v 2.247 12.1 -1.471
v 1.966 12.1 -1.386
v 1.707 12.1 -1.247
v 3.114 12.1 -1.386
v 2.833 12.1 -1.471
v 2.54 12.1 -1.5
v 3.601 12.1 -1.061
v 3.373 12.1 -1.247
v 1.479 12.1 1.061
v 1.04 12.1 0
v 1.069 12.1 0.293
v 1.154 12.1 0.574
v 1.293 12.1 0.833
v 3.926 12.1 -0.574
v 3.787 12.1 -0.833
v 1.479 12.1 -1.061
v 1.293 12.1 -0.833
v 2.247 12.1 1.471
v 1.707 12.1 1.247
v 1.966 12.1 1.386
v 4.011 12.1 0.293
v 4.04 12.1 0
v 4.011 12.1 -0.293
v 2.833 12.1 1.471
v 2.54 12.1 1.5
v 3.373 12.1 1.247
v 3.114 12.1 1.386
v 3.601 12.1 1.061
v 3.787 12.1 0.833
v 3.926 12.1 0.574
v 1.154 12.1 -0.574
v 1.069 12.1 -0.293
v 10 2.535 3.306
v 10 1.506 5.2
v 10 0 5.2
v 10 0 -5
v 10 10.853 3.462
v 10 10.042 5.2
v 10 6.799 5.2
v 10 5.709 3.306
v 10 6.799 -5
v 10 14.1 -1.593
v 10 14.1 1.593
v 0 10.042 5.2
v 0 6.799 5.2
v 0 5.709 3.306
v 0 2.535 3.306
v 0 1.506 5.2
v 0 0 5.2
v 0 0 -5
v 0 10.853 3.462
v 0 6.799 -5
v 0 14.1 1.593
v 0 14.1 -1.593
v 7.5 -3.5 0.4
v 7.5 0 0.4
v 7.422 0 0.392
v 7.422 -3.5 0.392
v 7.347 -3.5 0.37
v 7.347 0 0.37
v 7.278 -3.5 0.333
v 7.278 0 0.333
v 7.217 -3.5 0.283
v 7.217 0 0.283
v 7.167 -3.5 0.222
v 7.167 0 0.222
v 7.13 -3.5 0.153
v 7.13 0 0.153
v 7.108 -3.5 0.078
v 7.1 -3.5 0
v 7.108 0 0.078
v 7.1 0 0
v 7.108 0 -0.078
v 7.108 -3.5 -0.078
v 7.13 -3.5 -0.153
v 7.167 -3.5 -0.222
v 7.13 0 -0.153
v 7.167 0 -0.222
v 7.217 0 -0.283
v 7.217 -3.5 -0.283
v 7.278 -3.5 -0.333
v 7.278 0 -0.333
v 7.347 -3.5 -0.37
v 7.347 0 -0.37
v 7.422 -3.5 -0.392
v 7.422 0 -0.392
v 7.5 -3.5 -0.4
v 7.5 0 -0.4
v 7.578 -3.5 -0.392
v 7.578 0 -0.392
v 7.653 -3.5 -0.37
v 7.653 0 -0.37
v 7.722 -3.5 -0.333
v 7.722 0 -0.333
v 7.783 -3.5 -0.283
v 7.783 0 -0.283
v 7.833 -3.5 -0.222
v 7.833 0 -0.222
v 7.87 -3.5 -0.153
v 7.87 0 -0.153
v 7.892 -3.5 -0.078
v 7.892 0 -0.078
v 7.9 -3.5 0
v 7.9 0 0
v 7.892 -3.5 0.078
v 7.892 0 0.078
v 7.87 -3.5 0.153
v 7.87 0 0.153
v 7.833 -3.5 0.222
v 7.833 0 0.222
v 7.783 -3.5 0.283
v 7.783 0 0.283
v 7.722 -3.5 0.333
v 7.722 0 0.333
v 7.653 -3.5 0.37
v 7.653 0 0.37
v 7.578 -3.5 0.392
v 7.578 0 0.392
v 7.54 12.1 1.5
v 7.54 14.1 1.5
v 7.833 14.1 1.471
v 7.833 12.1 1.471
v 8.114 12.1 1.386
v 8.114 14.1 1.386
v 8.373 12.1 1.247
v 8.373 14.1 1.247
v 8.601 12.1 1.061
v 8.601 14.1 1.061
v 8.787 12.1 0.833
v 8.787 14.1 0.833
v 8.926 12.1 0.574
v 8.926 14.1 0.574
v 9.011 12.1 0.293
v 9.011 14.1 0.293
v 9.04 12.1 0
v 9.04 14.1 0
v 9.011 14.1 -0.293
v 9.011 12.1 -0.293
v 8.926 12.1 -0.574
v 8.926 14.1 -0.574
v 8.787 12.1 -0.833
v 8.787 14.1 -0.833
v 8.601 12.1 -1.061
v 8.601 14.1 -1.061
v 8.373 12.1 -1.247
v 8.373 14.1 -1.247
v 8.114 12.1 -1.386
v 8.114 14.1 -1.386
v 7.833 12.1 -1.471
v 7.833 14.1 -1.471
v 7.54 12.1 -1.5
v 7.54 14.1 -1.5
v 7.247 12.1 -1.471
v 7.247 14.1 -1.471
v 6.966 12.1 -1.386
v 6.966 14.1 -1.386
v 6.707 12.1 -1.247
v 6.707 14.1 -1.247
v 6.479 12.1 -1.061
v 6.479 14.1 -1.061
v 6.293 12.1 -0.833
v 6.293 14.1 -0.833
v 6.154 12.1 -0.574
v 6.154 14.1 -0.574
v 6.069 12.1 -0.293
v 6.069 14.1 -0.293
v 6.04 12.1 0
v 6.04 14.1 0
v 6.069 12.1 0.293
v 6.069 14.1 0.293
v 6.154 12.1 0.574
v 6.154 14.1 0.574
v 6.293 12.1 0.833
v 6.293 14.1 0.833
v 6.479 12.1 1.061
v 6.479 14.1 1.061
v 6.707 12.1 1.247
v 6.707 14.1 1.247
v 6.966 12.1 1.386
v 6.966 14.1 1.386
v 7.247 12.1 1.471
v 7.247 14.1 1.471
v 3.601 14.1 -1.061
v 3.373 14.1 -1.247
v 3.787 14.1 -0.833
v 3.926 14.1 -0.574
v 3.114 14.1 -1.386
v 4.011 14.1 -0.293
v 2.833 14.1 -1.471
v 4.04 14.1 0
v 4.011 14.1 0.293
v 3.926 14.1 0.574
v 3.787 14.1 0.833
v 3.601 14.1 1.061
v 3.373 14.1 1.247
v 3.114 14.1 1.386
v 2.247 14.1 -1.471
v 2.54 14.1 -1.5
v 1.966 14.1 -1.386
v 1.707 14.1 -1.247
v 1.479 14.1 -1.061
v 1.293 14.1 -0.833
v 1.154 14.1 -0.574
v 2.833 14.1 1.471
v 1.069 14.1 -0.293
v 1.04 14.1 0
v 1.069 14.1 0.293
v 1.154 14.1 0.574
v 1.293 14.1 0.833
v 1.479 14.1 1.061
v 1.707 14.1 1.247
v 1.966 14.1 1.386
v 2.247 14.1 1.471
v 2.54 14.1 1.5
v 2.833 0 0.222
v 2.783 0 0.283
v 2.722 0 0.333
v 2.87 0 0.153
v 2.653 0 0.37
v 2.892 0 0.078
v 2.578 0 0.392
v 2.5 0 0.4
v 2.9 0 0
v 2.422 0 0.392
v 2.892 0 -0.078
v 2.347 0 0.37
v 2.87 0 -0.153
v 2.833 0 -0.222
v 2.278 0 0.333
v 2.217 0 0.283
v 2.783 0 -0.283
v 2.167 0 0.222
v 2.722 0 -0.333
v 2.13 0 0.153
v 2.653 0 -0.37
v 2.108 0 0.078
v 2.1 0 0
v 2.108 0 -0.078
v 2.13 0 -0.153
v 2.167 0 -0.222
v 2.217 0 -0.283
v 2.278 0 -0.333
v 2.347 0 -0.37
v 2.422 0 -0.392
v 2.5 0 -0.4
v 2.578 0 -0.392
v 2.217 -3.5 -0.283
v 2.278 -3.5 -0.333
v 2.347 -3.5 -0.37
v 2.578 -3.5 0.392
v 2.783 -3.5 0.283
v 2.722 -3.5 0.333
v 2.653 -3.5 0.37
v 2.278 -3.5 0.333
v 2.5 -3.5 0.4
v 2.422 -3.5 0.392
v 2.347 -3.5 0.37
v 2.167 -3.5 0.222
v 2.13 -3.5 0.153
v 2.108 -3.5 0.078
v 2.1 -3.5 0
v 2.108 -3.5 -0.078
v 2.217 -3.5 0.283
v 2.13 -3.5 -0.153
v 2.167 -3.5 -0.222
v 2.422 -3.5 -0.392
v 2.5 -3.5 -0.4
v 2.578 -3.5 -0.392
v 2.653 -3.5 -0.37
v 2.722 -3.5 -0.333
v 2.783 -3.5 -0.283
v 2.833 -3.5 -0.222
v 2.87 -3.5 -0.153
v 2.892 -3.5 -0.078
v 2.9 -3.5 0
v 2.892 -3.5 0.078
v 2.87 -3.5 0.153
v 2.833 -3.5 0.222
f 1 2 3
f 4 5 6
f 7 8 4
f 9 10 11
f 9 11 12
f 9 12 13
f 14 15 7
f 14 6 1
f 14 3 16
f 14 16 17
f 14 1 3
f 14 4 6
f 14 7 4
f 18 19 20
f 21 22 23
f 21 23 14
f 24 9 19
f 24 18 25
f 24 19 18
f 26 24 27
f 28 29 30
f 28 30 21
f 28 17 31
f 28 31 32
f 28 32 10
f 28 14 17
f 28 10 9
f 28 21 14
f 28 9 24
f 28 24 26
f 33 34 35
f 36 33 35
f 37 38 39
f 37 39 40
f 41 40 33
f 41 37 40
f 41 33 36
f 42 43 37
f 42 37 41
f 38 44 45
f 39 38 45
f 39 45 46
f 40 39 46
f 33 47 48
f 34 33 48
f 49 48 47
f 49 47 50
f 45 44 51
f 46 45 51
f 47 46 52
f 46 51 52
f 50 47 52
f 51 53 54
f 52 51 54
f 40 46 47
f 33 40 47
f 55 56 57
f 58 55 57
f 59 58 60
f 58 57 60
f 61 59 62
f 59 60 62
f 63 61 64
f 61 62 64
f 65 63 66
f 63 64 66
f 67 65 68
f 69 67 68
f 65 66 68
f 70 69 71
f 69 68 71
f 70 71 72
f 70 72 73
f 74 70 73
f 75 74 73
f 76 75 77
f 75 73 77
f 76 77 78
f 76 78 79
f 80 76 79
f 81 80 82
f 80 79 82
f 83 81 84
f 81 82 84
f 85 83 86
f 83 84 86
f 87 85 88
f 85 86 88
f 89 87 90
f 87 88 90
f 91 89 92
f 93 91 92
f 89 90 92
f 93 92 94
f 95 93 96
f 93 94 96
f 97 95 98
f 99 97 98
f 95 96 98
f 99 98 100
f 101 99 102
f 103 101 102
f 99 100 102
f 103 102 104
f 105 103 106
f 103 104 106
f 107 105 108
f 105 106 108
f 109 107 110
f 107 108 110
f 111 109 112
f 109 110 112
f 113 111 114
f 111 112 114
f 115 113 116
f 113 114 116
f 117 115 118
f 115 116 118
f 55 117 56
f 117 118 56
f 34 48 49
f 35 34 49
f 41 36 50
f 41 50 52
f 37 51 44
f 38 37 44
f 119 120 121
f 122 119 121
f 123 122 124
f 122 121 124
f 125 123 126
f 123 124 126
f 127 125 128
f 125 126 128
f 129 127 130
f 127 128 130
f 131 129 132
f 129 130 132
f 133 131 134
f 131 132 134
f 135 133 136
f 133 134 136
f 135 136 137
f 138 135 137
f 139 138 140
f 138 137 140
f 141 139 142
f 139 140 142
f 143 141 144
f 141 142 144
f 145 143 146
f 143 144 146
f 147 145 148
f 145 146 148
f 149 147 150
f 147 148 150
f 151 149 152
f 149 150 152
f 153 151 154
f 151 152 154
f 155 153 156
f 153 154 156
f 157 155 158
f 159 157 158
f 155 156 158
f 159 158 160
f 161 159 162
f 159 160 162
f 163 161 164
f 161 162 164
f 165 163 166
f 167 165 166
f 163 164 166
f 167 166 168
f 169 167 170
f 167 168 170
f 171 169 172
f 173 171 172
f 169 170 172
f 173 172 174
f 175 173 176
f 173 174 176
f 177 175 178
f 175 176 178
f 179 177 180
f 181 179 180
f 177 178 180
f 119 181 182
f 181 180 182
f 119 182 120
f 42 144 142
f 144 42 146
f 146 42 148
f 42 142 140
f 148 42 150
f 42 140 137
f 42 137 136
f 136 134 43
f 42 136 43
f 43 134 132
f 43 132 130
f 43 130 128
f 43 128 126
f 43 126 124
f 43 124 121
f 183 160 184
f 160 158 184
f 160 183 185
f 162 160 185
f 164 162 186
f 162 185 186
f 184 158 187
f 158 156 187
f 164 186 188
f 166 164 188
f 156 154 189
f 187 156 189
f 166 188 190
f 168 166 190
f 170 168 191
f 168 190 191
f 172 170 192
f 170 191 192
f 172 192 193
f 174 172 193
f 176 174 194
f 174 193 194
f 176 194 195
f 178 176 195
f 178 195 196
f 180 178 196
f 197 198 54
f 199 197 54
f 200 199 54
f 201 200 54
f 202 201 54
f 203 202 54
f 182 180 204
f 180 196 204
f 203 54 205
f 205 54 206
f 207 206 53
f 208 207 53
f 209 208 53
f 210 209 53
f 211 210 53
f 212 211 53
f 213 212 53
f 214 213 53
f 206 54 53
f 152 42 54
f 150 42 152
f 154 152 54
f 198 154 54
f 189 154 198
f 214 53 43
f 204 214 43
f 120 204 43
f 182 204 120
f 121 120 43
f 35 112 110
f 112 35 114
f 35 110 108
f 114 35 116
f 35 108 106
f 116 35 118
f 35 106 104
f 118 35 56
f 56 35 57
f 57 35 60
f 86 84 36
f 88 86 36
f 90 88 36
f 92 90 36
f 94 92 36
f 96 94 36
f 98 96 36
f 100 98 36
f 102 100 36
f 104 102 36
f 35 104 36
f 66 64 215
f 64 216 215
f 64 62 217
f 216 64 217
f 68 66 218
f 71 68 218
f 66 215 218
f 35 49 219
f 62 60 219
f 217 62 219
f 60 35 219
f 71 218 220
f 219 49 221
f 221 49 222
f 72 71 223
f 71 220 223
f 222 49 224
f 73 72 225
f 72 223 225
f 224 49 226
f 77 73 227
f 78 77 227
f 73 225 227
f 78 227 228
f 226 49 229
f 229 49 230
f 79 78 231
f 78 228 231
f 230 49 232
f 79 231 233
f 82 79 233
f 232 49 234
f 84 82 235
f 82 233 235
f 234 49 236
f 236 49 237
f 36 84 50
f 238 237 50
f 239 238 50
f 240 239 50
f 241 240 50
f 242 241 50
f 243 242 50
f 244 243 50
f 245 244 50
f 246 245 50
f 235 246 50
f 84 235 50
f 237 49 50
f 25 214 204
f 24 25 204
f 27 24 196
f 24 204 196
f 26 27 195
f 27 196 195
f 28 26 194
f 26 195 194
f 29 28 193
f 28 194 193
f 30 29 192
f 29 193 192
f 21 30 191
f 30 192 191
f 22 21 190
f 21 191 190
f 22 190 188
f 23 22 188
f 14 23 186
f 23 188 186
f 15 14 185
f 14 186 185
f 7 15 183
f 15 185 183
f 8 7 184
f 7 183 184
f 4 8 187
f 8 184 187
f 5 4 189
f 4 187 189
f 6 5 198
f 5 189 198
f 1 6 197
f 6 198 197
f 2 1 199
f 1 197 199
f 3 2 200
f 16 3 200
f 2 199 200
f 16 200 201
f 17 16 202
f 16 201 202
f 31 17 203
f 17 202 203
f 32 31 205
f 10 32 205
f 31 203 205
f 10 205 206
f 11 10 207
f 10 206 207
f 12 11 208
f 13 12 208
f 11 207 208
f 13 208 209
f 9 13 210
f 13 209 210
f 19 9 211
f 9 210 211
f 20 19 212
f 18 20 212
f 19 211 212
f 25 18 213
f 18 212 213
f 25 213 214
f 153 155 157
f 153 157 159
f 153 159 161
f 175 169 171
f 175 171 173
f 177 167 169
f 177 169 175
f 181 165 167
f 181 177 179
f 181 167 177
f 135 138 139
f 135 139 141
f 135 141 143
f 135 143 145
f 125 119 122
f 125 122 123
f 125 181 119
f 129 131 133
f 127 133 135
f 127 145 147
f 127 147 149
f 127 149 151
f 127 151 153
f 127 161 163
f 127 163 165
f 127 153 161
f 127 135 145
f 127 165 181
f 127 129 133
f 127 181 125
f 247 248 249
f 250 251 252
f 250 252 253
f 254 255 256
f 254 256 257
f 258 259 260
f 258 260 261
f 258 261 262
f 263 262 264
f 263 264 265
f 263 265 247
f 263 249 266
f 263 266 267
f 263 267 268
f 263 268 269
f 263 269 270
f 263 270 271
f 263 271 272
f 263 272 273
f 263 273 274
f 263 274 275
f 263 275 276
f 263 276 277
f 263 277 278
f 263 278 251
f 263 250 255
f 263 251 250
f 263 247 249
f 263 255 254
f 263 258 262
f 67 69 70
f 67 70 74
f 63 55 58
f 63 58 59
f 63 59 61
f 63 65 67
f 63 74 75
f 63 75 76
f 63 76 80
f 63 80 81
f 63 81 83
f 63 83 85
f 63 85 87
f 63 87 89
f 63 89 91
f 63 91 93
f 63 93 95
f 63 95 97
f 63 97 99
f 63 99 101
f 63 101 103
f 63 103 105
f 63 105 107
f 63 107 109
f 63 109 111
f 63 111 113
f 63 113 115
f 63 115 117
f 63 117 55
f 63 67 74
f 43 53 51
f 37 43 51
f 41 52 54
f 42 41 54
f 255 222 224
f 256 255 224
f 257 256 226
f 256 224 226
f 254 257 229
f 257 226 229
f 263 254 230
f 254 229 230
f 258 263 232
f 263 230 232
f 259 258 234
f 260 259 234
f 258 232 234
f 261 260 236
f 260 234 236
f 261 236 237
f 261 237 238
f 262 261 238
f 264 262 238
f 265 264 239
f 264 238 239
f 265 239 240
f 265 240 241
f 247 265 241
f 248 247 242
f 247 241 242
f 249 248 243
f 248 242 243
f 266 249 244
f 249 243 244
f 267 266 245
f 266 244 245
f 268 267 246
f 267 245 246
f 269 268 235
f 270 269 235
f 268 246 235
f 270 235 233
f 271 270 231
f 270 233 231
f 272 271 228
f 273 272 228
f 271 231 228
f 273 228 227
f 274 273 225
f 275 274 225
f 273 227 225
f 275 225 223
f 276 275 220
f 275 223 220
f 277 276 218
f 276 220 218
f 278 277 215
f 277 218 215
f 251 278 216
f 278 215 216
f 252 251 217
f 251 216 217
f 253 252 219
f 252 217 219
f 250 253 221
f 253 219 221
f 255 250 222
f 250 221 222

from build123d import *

# Parameters (mm, degrees)
EXTRUDE_1_DEPTH     = 10
SKETCH_2_R          = 1.5
CUT_EXTRUDE_1_DEPTH = 2
SKETCH_3_R          = 0.4
EXTRUDE_2_DEPTH     = 3.5


with BuildPart() as part:
    # 草图1 → 凸台-拉伸1 (new body)
    with BuildSketch(Plane(origin=(0, 0, 0), x_dir=(0, 0, -1), z_dir=(1, 0, 0))):
        Polygon((0, 0), (5, 0), (5, 6.798949449), (1.592861235, 14.1), (-1.592861235, 14.1), (-3.462246636, 10.852770352), (-5.2, 10.041823104), (-5.2, 6.798949449), (-3.305827132, 5.708500208), (-3.305827132, 2.534594125), (-5.2, 1.506142854), (-5.2, 0), align=None)
    extrude(amount=EXTRUDE_1_DEPTH)

    # 草图2 → 切除-拉伸1 (cut)
    with BuildSketch(Plane(origin=(0, 14.1, 0), x_dir=(1, 0, 0), z_dir=(0, 1, 0))):
        with Locations(Location((2.54, 0, 0), (0, 0, 270))):
            Circle(SKETCH_2_R)
        with Locations(Location((7.54, 0, 0), (0, 0, 270))):
            Circle(SKETCH_2_R)
    extrude(amount=-CUT_EXTRUDE_1_DEPTH, mode=Mode.SUBTRACT)

    # 草图3 → 凸台-拉伸2 (add)
    with BuildSketch(Plane.XZ):
        with Locations(Location((2.5, 0, 0), (0, 0, 90))):
            Circle(SKETCH_3_R)
        with Locations(Location((7.5, 0, 0), (0, 0, 90))):
            Circle(SKETCH_3_R)
    extrude(amount=EXTRUDE_2_DEPTH)


solid = part.part
